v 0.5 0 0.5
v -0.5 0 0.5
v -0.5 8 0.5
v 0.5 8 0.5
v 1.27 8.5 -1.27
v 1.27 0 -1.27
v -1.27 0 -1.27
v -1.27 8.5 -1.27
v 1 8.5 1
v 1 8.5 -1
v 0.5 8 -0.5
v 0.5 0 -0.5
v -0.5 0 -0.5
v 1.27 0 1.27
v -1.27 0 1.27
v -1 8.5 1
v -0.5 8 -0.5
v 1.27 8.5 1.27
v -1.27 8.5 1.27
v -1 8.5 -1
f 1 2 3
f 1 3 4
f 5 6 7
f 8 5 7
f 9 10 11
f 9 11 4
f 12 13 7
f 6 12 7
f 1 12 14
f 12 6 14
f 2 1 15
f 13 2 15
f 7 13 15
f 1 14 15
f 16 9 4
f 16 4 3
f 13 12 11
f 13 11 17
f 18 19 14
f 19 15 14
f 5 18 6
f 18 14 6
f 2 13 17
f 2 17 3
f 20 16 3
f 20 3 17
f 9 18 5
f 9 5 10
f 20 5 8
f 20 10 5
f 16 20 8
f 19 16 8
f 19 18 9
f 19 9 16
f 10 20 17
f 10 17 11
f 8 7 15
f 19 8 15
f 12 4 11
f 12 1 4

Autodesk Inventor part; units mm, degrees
ref_plane "YZ Plane" through (0, 0, 0) normal (1, 0, 0) x (0, 1, 0)
ref_plane "XZ Plane" through (0, 0, 0) normal (0, 1, 0) x (-1, 0, 0)
ref_plane "XY Plane" through (0, 0, 0) normal (0, 0, 1) x (1, 0, 0)
sketch "Sketch1" plane through (0, 0, 0) normal (0, 1, 0) x (-1, 0, 0)
  line L0 (1.27, 1.27) -> (-1.27, 1.27)
  line L1 (-1.27, 1.27) -> (-1.27, -1.27)
  line L2 (-1.27, -1.27) -> (1.27, -1.27)
  line L3 (1.27, -1.27) -> (1.27, 1.27)
  line L4 (1.27, 1.27) -> (-1.27, -1.27) construction
  line L5 (-1.27, 1.27) -> (1.27, -1.27) construction
  line L6 (0.5, 0.5) -> (-0.5, 0.5)
  line L7 (-0.5, 0.5) -> (-0.5, -0.5)
  line L8 (-0.5, -0.5) -> (0.5, -0.5)
  line L9 (0.5, -0.5) -> (0.5, 0.5)
  line L10 (0.5, 0.5) -> (-0.5, -0.5) construction
  line L11 (-0.5, 0.5) -> (0.5, -0.5) construction
  point P0 (0, 0)
  dimension "d0" = 2.54
  dimension "d1" = 2.54
  dimension "d2" = 1
  dimension "d3" = 1
extrude "Extrusion1" add sketch "Sketch1" along normal blind 8.5
chamfer "Chamfer1" distance 0.5 angle 45 4 edges at (-0.5, 8.5, 0) (0, 8.5, -0.5) (0.5, 8.5, 0) (0, 8.5, 0.5)
properties part number "pinShroud" material "ABS Plastic"
